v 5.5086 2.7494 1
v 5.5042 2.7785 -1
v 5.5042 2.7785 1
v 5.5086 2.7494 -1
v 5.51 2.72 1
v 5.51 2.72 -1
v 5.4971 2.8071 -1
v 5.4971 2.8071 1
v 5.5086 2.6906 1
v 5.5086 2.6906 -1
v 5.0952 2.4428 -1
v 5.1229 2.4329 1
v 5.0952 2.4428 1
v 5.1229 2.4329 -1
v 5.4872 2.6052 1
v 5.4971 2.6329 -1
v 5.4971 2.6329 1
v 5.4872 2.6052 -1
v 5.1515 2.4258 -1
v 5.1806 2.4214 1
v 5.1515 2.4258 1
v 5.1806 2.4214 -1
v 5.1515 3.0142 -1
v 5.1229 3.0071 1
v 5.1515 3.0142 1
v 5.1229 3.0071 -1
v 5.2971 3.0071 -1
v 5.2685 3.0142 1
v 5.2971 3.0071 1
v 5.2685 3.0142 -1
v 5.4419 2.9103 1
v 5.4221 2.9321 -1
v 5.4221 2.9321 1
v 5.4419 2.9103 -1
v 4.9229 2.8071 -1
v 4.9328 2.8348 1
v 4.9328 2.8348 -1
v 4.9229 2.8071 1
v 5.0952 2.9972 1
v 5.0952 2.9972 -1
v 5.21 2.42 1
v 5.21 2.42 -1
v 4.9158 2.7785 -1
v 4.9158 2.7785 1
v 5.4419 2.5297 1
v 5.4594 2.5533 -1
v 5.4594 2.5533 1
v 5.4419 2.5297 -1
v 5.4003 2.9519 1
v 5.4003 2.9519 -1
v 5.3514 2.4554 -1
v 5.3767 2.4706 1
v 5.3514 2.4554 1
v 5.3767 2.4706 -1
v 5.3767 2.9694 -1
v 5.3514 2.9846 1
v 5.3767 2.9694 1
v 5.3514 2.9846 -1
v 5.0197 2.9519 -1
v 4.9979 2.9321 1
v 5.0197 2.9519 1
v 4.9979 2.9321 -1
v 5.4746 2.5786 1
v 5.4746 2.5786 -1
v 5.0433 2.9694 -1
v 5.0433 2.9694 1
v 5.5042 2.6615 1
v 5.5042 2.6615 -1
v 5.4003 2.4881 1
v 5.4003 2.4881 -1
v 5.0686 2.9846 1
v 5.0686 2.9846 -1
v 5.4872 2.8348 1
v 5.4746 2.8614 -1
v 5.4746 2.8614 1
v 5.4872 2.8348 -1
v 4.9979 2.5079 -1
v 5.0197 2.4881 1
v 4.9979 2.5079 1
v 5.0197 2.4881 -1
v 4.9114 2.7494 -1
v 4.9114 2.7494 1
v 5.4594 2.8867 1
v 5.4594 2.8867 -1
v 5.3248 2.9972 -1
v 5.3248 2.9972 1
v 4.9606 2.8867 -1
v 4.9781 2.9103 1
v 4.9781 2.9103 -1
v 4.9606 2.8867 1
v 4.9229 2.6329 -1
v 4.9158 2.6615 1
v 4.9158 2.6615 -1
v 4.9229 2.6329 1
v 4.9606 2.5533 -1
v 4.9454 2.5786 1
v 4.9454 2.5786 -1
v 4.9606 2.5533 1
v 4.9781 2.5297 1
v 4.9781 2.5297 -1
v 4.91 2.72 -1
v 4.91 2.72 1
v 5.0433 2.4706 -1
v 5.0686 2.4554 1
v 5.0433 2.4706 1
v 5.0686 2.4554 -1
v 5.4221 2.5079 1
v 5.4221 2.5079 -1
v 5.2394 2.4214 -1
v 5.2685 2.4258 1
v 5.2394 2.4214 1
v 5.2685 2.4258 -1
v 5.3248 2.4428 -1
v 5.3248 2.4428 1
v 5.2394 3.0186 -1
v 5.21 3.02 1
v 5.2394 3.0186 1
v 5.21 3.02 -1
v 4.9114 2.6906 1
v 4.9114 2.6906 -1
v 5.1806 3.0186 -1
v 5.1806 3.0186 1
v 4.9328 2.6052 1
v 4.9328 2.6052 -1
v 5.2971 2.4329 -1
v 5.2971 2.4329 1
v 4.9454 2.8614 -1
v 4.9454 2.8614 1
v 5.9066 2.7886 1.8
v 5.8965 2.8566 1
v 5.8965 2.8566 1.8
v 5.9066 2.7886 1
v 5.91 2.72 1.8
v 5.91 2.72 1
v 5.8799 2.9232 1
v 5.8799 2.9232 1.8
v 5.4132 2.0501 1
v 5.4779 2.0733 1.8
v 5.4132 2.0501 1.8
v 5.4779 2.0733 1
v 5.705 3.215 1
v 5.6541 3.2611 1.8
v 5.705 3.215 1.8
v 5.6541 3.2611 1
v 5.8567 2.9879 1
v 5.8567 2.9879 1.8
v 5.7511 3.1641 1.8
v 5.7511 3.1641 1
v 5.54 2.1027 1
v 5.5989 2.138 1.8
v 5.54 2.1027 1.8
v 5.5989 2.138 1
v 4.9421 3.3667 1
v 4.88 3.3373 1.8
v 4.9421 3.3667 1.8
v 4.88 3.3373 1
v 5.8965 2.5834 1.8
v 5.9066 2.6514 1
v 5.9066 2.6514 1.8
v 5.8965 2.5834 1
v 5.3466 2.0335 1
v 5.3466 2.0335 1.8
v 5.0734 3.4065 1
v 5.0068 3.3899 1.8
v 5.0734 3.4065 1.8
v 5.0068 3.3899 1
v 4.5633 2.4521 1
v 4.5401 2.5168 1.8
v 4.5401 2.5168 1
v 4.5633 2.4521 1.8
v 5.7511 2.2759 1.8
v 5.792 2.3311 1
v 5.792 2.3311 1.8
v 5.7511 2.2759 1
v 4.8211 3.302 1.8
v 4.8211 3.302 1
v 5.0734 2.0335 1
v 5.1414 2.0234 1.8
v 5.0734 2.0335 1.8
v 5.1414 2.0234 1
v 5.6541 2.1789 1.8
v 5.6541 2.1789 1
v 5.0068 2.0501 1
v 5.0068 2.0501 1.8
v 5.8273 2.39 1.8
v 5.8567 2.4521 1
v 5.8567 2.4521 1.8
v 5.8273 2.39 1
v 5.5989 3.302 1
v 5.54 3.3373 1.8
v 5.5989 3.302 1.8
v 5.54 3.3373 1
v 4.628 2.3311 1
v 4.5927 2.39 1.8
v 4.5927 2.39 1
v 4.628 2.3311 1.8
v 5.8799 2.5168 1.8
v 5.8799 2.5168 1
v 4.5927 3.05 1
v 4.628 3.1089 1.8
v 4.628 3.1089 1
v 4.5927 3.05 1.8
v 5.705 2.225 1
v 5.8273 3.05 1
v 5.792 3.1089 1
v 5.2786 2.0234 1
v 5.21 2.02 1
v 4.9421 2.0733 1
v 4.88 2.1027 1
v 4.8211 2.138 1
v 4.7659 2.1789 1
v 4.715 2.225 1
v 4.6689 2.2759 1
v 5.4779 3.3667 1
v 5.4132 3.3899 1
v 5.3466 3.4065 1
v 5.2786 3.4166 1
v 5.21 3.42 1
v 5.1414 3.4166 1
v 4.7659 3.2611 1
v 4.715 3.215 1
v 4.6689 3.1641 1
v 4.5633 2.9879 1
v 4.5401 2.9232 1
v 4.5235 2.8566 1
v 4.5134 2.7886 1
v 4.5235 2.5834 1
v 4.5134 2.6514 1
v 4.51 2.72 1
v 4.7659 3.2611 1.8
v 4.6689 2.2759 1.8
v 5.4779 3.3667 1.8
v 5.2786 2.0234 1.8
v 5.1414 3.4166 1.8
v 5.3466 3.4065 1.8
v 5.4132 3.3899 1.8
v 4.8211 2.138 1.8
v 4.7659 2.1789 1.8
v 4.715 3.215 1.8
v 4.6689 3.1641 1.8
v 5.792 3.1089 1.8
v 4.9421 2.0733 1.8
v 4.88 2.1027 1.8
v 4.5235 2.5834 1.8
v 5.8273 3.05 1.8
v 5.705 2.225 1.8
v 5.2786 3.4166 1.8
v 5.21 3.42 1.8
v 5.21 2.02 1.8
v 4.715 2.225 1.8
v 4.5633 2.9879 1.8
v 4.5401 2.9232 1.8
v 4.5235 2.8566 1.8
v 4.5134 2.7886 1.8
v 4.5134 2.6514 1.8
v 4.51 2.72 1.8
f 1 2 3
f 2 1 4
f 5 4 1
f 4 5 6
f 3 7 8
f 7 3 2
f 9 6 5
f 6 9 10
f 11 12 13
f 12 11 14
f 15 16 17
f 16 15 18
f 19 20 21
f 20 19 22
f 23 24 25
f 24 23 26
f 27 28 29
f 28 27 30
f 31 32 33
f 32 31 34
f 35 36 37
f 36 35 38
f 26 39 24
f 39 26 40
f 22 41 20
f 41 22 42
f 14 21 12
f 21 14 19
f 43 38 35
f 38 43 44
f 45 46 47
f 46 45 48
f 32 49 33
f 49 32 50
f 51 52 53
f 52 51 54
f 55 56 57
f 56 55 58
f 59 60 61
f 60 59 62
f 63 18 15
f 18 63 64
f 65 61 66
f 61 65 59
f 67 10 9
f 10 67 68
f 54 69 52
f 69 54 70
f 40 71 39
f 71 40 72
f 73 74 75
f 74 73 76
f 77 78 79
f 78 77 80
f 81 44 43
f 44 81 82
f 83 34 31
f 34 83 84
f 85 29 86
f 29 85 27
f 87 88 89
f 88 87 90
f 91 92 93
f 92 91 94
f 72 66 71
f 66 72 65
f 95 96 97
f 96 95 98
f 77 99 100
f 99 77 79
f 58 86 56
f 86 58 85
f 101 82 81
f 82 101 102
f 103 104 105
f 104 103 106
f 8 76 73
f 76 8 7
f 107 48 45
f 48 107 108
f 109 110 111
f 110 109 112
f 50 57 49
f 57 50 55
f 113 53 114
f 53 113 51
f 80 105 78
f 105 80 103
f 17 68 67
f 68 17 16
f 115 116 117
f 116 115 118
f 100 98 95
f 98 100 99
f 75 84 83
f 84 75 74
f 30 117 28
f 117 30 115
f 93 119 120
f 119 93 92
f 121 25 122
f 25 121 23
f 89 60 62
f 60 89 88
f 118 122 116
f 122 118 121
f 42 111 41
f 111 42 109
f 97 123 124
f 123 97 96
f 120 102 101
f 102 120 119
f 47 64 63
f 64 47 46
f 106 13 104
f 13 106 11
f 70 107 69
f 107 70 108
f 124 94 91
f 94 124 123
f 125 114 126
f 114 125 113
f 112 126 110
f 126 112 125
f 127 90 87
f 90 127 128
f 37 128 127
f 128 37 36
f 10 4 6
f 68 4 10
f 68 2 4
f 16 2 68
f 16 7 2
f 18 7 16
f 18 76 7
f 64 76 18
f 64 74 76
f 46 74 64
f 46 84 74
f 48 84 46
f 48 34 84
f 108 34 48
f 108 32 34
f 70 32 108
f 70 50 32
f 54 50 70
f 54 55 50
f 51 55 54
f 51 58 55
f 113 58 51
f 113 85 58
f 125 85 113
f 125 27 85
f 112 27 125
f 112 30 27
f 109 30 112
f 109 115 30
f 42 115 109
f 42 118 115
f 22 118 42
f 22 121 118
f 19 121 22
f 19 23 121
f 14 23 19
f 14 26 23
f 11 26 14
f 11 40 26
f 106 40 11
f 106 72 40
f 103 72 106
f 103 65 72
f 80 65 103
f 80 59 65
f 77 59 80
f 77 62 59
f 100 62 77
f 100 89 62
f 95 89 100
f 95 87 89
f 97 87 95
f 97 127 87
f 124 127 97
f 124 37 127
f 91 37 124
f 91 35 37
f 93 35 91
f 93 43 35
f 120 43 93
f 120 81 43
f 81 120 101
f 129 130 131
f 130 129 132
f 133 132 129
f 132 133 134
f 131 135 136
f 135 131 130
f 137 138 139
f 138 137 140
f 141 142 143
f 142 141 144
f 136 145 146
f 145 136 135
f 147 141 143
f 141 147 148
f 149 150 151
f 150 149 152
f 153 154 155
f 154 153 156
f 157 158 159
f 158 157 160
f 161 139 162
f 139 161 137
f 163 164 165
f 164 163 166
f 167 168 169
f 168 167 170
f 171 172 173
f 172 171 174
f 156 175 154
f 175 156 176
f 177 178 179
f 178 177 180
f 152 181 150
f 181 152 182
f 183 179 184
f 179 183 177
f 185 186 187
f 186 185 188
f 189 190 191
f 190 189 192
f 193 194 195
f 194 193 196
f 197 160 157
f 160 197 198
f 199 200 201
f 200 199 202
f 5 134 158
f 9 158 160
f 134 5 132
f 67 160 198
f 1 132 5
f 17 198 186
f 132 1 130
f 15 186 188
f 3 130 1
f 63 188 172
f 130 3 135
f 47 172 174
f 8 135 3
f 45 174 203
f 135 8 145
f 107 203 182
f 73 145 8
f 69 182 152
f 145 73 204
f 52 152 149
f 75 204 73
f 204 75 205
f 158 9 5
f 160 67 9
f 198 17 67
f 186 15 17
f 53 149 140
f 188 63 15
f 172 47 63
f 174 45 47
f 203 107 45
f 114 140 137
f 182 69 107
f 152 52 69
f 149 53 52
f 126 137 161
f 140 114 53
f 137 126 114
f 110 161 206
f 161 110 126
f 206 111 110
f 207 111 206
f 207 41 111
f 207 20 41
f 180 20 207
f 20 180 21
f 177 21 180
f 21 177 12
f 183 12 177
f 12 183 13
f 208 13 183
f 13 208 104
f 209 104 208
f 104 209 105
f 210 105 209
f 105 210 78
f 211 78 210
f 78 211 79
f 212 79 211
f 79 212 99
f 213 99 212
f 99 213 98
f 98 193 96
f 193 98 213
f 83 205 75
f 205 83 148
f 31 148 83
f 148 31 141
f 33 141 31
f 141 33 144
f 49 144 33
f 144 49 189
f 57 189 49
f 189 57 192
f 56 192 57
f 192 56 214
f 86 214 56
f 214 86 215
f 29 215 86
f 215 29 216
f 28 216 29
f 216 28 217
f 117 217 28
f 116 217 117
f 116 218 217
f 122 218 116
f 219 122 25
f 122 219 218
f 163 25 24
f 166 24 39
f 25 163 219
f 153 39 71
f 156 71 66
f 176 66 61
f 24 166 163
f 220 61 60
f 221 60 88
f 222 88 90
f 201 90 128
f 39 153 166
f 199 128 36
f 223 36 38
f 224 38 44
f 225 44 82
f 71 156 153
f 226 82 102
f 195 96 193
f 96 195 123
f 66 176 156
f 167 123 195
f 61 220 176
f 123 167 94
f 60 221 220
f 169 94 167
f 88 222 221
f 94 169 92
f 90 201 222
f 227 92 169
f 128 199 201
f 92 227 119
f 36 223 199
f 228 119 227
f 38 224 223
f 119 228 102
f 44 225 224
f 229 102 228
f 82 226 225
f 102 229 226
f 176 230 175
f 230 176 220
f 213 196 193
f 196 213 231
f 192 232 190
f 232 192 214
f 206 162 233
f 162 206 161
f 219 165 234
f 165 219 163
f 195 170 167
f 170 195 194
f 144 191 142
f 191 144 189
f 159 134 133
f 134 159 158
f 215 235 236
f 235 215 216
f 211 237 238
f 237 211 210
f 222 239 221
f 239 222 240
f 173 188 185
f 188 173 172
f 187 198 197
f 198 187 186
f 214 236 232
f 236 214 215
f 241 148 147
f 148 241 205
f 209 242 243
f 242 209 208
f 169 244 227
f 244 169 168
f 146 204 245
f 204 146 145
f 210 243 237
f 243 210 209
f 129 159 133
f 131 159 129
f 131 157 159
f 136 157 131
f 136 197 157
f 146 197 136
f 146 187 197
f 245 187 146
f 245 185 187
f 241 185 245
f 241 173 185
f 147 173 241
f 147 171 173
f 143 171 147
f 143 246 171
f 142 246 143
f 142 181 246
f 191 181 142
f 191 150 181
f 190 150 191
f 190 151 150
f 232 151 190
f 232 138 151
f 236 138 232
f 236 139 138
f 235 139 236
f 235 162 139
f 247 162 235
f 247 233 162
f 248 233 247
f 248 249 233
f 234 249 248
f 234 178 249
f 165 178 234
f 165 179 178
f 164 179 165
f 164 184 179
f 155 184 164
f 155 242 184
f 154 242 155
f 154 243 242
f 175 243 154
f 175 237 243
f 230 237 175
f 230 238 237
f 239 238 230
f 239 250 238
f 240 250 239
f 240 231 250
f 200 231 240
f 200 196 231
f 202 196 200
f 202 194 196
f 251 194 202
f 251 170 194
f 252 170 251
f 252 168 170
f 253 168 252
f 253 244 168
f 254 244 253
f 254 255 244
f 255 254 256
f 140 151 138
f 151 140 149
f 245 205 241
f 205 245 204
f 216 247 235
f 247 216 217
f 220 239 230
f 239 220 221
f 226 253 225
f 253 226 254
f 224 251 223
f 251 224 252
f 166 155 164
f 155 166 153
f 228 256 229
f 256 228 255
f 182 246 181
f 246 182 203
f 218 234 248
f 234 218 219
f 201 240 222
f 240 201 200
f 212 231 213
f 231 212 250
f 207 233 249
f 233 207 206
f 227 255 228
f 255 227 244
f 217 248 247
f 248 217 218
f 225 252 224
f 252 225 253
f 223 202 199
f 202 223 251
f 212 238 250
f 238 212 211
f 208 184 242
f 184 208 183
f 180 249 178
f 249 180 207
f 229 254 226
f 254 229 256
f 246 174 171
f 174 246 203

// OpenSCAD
$fn=64;

axial = [5.21, 2.72, 0];

module axial_marker(v=[0,0,0], shaft_d=0.6, head_d=1.4, head_h=0.8, shaft_h=2.0) {
    translate(v)
    union() {
        cylinder(d=shaft_d, h=shaft_h, center=true);
        translate([0,0,shaft_h/2 + head_h/2])
            cylinder(d=head_d, h=head_h, center=true);
    }
}

axial_marker(axial);
